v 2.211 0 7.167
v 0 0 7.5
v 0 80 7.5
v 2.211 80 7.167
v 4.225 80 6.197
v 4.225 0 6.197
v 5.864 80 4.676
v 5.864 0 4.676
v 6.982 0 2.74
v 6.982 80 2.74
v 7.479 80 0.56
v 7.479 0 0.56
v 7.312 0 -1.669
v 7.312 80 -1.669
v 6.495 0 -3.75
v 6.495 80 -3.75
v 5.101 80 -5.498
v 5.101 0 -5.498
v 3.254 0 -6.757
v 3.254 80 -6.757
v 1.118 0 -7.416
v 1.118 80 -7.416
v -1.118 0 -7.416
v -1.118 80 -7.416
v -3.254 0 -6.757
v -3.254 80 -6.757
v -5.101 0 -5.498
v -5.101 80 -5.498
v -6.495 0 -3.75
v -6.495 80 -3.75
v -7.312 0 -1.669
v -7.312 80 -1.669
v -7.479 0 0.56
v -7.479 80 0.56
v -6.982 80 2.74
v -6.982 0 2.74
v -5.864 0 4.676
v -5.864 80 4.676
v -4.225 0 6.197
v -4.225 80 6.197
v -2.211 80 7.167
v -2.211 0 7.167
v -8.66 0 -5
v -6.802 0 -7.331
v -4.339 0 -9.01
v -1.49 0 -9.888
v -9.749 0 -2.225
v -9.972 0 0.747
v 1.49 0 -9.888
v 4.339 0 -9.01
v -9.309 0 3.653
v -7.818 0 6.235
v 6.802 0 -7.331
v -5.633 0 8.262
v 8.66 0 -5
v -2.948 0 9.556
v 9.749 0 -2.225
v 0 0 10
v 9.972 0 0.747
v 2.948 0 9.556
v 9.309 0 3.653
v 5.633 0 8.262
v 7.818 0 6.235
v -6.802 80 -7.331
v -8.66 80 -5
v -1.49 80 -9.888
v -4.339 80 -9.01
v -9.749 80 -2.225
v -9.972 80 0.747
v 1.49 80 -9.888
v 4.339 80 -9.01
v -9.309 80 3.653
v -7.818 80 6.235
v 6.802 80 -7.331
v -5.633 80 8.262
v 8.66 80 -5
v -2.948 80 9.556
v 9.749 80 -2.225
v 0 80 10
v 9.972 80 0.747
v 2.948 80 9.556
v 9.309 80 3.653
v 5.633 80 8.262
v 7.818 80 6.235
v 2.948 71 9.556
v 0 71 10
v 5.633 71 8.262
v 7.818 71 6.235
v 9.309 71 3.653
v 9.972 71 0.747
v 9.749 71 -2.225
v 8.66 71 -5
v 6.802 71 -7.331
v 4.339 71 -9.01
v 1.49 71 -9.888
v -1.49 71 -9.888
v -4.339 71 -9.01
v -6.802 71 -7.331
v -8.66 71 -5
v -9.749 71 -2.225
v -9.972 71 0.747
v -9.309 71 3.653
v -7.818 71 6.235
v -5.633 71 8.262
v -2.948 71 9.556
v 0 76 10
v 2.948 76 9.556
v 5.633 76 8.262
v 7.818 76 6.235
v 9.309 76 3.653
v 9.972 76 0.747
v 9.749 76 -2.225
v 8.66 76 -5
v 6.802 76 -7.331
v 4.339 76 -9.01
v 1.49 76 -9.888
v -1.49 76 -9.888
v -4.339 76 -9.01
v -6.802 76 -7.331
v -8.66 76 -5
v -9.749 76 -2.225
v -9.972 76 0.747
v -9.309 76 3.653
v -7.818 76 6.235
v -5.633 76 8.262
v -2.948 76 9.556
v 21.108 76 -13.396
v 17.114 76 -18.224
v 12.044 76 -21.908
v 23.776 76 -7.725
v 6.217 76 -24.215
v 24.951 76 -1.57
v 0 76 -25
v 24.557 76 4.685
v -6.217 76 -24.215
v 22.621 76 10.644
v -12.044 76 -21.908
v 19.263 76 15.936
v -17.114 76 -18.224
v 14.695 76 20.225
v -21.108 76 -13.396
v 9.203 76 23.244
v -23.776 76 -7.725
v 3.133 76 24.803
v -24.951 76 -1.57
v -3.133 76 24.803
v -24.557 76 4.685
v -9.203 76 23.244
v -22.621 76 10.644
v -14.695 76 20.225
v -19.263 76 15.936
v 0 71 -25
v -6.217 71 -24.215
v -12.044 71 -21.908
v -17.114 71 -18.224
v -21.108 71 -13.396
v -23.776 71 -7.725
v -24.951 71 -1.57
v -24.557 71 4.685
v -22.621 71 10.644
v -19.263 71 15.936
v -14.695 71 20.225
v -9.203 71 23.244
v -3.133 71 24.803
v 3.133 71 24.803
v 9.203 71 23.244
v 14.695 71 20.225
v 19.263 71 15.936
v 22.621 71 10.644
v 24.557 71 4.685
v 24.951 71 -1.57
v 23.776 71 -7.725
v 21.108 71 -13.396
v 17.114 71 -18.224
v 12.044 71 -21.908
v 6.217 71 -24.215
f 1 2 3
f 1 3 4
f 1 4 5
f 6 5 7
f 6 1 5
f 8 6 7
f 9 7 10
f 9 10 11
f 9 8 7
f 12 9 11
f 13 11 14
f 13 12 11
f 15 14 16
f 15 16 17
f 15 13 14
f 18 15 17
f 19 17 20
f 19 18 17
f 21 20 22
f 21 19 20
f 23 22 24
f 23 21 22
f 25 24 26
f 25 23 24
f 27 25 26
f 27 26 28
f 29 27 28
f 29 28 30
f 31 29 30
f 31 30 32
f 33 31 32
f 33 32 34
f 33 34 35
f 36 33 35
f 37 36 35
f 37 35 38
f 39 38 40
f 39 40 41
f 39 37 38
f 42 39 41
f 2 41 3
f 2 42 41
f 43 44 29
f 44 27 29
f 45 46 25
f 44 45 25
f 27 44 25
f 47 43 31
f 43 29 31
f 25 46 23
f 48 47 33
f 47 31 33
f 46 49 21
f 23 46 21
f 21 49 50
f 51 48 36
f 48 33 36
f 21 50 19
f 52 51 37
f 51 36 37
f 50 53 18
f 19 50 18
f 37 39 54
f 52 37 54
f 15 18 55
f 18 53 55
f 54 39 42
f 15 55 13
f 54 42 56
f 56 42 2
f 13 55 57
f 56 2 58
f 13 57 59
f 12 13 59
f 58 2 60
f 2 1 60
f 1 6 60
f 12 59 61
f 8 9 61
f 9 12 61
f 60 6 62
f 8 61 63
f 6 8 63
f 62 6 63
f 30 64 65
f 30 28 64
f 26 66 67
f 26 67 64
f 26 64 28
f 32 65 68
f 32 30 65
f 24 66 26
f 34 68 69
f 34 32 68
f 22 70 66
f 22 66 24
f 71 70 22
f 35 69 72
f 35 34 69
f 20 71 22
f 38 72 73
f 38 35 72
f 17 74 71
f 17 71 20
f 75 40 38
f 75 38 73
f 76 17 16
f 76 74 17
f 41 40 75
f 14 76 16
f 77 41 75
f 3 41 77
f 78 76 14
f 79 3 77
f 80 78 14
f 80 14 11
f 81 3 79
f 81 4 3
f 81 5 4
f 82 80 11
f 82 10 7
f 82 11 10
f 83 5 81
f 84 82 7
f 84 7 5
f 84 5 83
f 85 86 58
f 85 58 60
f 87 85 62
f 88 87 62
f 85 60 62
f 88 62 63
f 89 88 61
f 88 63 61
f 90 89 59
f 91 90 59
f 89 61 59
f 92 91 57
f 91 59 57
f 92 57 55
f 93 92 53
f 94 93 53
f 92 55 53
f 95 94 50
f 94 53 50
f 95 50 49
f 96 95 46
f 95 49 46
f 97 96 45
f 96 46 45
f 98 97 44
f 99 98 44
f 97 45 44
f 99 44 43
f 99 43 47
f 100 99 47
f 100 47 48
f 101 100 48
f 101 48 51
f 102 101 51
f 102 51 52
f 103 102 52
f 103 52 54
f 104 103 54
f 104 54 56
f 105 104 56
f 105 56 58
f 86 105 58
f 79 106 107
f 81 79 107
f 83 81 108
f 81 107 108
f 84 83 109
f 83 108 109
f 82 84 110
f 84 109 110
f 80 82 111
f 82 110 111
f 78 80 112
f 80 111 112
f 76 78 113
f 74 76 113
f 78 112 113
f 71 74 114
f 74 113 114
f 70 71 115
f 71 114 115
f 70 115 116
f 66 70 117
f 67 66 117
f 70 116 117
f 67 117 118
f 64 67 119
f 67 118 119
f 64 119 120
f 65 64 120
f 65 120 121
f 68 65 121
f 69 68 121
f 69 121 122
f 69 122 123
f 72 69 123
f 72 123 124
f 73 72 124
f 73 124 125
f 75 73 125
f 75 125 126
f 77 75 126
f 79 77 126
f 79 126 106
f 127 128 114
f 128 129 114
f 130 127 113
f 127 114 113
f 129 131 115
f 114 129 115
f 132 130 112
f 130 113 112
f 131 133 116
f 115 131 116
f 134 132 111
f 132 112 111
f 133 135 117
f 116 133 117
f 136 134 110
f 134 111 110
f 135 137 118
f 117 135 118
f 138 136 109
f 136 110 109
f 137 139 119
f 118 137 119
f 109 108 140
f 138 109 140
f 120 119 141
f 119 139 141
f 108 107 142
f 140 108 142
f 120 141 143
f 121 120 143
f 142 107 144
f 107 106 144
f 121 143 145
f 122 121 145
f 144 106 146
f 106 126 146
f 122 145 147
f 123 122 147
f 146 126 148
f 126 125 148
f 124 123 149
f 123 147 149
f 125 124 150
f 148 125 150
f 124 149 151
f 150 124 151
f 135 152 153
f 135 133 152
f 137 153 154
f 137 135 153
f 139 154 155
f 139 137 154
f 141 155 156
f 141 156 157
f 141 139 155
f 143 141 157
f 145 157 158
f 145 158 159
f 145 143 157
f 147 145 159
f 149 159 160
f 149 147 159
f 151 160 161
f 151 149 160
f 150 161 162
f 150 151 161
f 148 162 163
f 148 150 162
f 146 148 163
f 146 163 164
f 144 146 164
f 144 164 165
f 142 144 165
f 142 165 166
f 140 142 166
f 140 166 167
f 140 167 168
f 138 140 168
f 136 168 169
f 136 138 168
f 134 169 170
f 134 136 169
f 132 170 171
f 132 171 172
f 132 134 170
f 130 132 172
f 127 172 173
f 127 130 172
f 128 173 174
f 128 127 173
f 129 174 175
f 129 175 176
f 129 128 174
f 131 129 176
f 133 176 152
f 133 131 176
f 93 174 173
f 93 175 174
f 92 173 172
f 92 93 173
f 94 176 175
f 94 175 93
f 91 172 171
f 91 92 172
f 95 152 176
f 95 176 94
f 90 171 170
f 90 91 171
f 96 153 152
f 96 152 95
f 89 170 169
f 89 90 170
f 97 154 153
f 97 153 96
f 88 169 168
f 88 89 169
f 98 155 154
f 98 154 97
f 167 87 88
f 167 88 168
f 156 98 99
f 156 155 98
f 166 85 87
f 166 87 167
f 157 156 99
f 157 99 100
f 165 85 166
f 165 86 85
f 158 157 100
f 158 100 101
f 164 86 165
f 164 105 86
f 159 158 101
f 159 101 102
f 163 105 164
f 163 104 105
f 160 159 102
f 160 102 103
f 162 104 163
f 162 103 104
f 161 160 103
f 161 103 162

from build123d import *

# Parameters (mm, degrees)
SKETCH1_R           = 10
SKETCH1_R_2         = 7.5
BOSS_EXTRUDE1_DEPTH = 80
SKETCH2_W           = 15
SKETCH2_H           = 5


with BuildPart() as part:
    # Sketch1 → Boss-Extrude1 (new body)
    with BuildSketch(Plane(origin=(0, 0, 0), x_dir=(1, 0, 0), z_dir=(0, 1, 0))):
        with Locations(Location((0, 0, 0), (0, 0, 270))):
            Circle(SKETCH1_R)
        with Locations(Location((0, 0, 0), (0, 0, 270))):
            Circle(SKETCH1_R_2, mode=Mode.SUBTRACT)
    extrude(amount=BOSS_EXTRUDE1_DEPTH)

    # Sketch2 → Revolve1 (revolve)
    with BuildSketch(Plane(origin=(0, 0, 0), x_dir=(0, 0, -1), z_dir=(1, 0, 0))):
        with Locations((17.5, 73.5)):
            Rectangle(SKETCH2_W, SKETCH2_H)
    revolve(axis=Axis((0, 0, 0), (0, 1, 0)))


solid = part.part
